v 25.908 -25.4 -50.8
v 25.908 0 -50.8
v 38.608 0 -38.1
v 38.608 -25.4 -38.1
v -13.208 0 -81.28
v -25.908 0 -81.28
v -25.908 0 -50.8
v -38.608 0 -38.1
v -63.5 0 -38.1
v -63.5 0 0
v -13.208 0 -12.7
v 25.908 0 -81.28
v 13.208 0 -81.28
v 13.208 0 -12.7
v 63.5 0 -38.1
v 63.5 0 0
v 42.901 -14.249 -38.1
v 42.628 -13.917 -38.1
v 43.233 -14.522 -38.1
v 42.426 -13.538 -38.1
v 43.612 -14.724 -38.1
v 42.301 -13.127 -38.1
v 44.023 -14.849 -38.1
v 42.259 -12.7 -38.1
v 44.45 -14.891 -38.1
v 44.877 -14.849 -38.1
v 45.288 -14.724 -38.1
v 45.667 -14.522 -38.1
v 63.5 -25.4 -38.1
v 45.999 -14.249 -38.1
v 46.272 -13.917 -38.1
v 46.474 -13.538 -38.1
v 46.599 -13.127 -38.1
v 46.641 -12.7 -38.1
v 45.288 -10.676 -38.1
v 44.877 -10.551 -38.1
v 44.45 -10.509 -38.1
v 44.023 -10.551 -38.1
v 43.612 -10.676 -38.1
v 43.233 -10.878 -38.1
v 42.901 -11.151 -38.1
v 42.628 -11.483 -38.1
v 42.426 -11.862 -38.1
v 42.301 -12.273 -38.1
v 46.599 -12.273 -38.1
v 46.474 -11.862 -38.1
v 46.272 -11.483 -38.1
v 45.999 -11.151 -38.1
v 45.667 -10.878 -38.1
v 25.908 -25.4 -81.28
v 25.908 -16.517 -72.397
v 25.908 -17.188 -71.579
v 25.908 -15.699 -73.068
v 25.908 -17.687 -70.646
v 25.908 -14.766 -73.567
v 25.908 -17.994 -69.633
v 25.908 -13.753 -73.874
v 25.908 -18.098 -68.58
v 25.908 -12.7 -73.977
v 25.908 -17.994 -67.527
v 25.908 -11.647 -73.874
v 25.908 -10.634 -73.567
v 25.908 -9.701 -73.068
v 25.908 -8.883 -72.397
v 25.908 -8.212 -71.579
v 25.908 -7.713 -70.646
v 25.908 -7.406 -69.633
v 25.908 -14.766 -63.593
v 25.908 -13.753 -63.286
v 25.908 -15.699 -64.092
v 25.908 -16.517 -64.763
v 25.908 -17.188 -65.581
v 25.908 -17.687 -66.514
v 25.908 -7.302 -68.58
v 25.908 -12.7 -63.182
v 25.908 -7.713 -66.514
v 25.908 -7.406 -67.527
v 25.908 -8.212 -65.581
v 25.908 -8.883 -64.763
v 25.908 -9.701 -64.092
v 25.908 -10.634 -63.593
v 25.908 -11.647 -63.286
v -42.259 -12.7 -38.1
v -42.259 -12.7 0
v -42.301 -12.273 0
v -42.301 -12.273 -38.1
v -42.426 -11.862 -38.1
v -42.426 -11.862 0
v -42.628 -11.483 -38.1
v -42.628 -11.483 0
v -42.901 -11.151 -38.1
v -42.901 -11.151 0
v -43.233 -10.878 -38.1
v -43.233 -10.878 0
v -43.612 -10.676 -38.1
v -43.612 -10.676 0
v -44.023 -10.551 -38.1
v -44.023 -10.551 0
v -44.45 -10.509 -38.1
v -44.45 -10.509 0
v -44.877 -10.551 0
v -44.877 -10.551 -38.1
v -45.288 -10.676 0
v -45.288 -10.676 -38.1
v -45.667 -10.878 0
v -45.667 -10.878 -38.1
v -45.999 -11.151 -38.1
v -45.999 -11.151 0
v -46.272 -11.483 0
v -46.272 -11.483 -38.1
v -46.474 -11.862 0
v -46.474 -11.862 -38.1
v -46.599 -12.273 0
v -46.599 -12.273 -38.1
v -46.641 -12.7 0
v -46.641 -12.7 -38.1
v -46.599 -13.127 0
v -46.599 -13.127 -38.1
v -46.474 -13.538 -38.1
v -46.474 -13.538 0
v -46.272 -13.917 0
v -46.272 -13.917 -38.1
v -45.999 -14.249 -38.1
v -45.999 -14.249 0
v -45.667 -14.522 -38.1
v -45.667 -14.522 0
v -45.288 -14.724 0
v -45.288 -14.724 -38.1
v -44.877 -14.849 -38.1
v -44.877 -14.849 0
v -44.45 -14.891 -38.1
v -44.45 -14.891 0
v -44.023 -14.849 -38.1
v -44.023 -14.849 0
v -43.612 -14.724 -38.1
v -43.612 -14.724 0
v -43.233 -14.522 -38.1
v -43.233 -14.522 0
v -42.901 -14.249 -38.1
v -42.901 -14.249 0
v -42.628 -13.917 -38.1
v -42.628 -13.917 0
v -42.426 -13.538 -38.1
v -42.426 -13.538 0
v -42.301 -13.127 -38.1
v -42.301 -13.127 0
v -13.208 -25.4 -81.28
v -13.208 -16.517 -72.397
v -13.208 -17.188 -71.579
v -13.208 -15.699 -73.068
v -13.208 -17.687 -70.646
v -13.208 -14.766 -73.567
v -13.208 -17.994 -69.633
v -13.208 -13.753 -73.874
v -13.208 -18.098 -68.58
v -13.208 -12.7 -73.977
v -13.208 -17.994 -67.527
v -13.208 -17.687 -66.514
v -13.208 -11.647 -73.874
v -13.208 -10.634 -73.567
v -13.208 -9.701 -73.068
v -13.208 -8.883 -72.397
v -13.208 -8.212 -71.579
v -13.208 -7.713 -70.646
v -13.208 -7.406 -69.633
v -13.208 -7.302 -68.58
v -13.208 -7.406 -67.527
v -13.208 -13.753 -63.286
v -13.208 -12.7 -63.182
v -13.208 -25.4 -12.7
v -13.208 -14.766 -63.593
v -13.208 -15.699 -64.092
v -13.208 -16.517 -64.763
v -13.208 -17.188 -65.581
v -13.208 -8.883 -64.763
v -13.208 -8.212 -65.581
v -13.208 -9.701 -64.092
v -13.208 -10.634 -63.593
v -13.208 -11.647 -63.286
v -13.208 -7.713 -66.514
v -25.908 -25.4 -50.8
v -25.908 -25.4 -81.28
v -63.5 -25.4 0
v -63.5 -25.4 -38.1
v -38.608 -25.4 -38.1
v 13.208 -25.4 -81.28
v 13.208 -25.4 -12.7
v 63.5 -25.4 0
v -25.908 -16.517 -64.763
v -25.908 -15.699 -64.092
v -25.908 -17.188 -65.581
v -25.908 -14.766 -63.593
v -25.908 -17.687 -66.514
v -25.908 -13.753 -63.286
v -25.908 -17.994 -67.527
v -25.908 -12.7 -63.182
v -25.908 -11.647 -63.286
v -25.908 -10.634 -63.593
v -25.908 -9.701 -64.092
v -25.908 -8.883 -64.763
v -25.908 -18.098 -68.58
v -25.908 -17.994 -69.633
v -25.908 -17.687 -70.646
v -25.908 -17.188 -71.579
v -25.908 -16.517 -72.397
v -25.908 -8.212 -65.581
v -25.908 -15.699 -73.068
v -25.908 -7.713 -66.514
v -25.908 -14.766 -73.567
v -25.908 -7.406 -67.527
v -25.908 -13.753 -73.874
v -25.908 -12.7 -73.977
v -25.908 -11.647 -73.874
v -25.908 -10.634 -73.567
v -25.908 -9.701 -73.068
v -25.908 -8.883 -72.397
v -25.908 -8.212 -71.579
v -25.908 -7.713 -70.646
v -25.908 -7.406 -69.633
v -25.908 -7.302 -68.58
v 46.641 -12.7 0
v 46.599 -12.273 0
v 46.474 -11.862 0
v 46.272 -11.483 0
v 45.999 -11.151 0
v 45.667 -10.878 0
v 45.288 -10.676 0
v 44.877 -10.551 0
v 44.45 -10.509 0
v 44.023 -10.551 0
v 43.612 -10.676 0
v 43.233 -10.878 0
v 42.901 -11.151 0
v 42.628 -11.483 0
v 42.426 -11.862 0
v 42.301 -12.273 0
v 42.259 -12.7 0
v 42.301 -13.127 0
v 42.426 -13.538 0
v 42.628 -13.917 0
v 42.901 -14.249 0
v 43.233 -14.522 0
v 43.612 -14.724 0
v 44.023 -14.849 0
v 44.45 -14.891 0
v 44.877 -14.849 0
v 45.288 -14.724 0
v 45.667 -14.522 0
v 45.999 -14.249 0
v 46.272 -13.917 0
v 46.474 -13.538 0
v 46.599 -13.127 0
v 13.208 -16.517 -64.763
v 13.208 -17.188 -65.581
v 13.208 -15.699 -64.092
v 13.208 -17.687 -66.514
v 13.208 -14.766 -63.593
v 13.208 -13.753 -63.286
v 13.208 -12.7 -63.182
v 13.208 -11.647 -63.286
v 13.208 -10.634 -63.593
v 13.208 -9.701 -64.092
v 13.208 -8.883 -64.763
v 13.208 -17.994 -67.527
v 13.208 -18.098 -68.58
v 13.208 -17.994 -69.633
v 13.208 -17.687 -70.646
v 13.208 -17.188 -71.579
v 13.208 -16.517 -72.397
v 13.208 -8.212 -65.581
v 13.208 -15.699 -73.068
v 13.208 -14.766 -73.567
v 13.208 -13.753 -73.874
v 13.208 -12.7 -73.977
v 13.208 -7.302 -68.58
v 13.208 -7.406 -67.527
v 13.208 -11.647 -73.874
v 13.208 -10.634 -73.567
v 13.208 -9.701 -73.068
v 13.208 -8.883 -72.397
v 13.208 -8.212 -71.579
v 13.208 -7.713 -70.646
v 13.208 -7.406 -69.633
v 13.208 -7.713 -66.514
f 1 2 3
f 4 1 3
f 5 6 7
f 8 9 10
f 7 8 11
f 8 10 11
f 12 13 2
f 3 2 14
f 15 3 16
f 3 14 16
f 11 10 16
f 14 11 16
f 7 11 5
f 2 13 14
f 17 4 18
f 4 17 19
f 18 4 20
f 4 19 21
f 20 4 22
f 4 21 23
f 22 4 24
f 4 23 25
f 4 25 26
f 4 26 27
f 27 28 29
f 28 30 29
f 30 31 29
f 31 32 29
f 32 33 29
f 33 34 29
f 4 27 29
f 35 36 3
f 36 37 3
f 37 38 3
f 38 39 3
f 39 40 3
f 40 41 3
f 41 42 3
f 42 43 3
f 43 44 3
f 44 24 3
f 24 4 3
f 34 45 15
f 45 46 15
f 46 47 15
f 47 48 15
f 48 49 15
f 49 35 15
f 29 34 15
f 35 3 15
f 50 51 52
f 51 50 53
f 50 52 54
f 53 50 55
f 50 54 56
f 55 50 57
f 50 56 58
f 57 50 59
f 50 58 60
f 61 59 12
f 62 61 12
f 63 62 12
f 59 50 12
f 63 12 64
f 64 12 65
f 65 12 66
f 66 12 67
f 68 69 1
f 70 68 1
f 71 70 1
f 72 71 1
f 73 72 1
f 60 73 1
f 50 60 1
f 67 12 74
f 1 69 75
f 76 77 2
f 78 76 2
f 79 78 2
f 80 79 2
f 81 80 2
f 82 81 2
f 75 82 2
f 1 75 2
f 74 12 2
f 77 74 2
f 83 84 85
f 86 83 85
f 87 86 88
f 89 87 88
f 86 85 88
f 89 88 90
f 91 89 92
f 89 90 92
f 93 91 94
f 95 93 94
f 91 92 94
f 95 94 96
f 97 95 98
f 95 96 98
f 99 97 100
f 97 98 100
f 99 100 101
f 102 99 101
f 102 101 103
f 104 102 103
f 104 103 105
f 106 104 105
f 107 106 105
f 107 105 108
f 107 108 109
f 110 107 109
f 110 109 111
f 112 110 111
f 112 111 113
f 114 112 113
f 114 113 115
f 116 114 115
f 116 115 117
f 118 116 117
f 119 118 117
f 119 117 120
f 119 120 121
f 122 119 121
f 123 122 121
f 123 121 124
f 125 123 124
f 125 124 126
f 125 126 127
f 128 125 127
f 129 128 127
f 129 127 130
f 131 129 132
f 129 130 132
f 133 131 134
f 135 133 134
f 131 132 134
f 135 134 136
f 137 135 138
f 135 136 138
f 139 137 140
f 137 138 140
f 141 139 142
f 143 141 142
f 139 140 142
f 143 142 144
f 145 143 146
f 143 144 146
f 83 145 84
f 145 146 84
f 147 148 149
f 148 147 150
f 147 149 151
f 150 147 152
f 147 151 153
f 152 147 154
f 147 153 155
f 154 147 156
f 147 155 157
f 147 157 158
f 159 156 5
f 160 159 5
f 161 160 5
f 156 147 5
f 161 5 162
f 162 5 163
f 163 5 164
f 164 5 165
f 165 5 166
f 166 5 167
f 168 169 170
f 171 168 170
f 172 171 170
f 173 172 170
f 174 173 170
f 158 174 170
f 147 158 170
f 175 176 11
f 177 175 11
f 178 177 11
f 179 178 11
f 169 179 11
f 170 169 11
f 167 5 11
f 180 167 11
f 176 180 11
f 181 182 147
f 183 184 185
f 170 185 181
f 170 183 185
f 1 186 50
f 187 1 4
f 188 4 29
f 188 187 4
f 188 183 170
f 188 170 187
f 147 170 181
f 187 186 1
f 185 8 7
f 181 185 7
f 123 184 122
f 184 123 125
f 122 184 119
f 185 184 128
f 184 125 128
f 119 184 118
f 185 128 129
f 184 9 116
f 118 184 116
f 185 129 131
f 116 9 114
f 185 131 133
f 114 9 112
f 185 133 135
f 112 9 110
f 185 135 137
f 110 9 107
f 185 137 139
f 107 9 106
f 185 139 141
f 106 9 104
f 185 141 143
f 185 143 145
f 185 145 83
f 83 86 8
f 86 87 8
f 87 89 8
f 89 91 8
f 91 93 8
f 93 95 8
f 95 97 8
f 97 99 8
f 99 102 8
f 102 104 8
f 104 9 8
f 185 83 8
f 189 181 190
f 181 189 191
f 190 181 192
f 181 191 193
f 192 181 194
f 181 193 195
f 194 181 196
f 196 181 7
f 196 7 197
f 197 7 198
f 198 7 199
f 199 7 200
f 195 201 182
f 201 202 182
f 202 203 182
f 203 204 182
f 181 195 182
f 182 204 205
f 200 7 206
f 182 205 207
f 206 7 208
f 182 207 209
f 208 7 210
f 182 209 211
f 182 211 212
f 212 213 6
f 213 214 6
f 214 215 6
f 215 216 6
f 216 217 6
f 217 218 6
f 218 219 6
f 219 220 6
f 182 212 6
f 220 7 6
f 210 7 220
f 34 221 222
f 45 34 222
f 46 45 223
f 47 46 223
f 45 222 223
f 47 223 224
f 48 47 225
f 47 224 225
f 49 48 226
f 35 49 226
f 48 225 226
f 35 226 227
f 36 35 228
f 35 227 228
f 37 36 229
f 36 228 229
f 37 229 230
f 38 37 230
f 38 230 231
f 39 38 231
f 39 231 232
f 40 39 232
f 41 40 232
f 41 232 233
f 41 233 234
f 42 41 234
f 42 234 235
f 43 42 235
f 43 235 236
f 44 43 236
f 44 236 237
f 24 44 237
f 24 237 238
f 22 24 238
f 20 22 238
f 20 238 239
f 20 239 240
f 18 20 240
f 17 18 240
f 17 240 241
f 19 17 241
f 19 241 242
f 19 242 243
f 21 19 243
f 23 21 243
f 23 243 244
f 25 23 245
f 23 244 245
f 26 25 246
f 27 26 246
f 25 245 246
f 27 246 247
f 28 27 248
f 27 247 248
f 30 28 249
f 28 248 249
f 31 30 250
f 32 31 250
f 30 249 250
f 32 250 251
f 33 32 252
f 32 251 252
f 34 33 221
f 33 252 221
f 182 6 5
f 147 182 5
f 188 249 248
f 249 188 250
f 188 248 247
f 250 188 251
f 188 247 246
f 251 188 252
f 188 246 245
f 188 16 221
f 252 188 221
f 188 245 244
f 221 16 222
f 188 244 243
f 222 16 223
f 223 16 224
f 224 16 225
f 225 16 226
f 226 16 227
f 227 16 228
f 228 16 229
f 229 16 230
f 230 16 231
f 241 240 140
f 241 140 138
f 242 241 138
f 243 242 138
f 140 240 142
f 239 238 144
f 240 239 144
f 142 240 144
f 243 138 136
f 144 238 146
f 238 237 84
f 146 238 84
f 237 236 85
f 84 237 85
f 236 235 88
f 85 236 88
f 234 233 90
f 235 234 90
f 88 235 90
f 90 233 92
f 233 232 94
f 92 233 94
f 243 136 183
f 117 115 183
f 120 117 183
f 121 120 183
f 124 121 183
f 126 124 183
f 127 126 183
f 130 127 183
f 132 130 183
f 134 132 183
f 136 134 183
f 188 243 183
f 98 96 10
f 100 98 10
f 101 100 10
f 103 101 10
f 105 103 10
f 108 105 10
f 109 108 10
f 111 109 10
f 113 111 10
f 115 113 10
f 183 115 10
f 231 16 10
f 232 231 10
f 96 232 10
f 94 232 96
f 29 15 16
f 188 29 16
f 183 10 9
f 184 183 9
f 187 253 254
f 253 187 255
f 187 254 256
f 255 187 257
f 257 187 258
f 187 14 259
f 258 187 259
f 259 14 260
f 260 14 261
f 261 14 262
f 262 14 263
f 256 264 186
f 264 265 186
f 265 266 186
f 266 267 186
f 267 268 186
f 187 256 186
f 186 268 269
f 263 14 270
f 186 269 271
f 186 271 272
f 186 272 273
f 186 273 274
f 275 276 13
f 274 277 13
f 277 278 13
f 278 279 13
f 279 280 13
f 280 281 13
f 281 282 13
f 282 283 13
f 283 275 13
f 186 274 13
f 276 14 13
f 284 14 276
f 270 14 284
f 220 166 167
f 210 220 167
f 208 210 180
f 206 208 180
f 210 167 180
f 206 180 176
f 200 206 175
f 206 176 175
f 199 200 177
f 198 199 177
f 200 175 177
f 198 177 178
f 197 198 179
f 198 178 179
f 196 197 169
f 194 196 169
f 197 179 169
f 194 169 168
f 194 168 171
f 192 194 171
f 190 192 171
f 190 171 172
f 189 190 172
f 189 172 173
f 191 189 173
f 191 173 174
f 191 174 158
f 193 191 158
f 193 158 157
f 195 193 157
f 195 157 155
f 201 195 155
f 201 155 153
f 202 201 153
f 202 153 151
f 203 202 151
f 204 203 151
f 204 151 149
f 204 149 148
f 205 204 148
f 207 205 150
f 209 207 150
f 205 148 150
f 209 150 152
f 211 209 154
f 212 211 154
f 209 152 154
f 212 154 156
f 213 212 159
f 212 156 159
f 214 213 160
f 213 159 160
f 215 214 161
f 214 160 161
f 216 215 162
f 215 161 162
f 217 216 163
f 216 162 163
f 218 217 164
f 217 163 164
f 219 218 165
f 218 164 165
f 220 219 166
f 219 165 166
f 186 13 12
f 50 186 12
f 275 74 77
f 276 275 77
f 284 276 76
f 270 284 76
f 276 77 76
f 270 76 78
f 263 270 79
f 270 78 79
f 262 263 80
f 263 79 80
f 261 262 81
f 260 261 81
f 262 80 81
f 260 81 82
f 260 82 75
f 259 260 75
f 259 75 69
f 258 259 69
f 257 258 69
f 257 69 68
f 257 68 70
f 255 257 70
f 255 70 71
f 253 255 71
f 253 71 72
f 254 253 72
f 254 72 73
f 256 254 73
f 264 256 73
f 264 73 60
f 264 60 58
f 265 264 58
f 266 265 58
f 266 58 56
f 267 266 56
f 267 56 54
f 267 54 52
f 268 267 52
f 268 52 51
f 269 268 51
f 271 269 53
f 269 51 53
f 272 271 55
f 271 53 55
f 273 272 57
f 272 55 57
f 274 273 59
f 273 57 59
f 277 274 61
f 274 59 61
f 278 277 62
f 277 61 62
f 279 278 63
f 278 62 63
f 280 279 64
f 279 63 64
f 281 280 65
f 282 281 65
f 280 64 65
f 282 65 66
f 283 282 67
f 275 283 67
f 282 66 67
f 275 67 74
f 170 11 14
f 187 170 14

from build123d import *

# Parameters (mm, degrees)
F1_DEPTH = 25.4
F2_R     = 2.19075
F3_DEPTH = 81.281
F4_R     = 5.3975
F5_DEPTH = 89.409


with BuildPart() as f1:
    # F0 (on Front) → F1 (new body)
    with BuildSketch(Plane.XZ):
        Polygon((25.908, -50.8), (38.608, -38.1), (63.5, -38.1), (63.5, 0), (0, 0), (-63.5, 0), (-63.5, -38.1), (-38.608, -38.1), (-25.908, -50.8), (-25.908, -81.28), (-13.208, -81.28), (-13.208, -12.7), (13.208, -12.7), (13.208, -81.28), (25.908, -81.28), align=None)
    extrude(amount=F1_DEPTH)

    # F2 (on face) → F3 (cut, through all)
    with BuildSketch(Plane.XY):
        with Locations((-44.45, -12.7)):
            Circle(F2_R)
        with Locations((44.45, -12.7)):
            Circle(F2_R)
    extrude(amount=-F3_DEPTH, mode=Mode.SUBTRACT)

    # F4 (on face) → F5 (cut, through all)
    with BuildSketch(Plane.YZ.offset(25.908)):
        with Locations((-12.7, -68.58)):
            Circle(F4_R)
    extrude(amount=-F5_DEPTH, mode=Mode.SUBTRACT)


solid = f1.part
